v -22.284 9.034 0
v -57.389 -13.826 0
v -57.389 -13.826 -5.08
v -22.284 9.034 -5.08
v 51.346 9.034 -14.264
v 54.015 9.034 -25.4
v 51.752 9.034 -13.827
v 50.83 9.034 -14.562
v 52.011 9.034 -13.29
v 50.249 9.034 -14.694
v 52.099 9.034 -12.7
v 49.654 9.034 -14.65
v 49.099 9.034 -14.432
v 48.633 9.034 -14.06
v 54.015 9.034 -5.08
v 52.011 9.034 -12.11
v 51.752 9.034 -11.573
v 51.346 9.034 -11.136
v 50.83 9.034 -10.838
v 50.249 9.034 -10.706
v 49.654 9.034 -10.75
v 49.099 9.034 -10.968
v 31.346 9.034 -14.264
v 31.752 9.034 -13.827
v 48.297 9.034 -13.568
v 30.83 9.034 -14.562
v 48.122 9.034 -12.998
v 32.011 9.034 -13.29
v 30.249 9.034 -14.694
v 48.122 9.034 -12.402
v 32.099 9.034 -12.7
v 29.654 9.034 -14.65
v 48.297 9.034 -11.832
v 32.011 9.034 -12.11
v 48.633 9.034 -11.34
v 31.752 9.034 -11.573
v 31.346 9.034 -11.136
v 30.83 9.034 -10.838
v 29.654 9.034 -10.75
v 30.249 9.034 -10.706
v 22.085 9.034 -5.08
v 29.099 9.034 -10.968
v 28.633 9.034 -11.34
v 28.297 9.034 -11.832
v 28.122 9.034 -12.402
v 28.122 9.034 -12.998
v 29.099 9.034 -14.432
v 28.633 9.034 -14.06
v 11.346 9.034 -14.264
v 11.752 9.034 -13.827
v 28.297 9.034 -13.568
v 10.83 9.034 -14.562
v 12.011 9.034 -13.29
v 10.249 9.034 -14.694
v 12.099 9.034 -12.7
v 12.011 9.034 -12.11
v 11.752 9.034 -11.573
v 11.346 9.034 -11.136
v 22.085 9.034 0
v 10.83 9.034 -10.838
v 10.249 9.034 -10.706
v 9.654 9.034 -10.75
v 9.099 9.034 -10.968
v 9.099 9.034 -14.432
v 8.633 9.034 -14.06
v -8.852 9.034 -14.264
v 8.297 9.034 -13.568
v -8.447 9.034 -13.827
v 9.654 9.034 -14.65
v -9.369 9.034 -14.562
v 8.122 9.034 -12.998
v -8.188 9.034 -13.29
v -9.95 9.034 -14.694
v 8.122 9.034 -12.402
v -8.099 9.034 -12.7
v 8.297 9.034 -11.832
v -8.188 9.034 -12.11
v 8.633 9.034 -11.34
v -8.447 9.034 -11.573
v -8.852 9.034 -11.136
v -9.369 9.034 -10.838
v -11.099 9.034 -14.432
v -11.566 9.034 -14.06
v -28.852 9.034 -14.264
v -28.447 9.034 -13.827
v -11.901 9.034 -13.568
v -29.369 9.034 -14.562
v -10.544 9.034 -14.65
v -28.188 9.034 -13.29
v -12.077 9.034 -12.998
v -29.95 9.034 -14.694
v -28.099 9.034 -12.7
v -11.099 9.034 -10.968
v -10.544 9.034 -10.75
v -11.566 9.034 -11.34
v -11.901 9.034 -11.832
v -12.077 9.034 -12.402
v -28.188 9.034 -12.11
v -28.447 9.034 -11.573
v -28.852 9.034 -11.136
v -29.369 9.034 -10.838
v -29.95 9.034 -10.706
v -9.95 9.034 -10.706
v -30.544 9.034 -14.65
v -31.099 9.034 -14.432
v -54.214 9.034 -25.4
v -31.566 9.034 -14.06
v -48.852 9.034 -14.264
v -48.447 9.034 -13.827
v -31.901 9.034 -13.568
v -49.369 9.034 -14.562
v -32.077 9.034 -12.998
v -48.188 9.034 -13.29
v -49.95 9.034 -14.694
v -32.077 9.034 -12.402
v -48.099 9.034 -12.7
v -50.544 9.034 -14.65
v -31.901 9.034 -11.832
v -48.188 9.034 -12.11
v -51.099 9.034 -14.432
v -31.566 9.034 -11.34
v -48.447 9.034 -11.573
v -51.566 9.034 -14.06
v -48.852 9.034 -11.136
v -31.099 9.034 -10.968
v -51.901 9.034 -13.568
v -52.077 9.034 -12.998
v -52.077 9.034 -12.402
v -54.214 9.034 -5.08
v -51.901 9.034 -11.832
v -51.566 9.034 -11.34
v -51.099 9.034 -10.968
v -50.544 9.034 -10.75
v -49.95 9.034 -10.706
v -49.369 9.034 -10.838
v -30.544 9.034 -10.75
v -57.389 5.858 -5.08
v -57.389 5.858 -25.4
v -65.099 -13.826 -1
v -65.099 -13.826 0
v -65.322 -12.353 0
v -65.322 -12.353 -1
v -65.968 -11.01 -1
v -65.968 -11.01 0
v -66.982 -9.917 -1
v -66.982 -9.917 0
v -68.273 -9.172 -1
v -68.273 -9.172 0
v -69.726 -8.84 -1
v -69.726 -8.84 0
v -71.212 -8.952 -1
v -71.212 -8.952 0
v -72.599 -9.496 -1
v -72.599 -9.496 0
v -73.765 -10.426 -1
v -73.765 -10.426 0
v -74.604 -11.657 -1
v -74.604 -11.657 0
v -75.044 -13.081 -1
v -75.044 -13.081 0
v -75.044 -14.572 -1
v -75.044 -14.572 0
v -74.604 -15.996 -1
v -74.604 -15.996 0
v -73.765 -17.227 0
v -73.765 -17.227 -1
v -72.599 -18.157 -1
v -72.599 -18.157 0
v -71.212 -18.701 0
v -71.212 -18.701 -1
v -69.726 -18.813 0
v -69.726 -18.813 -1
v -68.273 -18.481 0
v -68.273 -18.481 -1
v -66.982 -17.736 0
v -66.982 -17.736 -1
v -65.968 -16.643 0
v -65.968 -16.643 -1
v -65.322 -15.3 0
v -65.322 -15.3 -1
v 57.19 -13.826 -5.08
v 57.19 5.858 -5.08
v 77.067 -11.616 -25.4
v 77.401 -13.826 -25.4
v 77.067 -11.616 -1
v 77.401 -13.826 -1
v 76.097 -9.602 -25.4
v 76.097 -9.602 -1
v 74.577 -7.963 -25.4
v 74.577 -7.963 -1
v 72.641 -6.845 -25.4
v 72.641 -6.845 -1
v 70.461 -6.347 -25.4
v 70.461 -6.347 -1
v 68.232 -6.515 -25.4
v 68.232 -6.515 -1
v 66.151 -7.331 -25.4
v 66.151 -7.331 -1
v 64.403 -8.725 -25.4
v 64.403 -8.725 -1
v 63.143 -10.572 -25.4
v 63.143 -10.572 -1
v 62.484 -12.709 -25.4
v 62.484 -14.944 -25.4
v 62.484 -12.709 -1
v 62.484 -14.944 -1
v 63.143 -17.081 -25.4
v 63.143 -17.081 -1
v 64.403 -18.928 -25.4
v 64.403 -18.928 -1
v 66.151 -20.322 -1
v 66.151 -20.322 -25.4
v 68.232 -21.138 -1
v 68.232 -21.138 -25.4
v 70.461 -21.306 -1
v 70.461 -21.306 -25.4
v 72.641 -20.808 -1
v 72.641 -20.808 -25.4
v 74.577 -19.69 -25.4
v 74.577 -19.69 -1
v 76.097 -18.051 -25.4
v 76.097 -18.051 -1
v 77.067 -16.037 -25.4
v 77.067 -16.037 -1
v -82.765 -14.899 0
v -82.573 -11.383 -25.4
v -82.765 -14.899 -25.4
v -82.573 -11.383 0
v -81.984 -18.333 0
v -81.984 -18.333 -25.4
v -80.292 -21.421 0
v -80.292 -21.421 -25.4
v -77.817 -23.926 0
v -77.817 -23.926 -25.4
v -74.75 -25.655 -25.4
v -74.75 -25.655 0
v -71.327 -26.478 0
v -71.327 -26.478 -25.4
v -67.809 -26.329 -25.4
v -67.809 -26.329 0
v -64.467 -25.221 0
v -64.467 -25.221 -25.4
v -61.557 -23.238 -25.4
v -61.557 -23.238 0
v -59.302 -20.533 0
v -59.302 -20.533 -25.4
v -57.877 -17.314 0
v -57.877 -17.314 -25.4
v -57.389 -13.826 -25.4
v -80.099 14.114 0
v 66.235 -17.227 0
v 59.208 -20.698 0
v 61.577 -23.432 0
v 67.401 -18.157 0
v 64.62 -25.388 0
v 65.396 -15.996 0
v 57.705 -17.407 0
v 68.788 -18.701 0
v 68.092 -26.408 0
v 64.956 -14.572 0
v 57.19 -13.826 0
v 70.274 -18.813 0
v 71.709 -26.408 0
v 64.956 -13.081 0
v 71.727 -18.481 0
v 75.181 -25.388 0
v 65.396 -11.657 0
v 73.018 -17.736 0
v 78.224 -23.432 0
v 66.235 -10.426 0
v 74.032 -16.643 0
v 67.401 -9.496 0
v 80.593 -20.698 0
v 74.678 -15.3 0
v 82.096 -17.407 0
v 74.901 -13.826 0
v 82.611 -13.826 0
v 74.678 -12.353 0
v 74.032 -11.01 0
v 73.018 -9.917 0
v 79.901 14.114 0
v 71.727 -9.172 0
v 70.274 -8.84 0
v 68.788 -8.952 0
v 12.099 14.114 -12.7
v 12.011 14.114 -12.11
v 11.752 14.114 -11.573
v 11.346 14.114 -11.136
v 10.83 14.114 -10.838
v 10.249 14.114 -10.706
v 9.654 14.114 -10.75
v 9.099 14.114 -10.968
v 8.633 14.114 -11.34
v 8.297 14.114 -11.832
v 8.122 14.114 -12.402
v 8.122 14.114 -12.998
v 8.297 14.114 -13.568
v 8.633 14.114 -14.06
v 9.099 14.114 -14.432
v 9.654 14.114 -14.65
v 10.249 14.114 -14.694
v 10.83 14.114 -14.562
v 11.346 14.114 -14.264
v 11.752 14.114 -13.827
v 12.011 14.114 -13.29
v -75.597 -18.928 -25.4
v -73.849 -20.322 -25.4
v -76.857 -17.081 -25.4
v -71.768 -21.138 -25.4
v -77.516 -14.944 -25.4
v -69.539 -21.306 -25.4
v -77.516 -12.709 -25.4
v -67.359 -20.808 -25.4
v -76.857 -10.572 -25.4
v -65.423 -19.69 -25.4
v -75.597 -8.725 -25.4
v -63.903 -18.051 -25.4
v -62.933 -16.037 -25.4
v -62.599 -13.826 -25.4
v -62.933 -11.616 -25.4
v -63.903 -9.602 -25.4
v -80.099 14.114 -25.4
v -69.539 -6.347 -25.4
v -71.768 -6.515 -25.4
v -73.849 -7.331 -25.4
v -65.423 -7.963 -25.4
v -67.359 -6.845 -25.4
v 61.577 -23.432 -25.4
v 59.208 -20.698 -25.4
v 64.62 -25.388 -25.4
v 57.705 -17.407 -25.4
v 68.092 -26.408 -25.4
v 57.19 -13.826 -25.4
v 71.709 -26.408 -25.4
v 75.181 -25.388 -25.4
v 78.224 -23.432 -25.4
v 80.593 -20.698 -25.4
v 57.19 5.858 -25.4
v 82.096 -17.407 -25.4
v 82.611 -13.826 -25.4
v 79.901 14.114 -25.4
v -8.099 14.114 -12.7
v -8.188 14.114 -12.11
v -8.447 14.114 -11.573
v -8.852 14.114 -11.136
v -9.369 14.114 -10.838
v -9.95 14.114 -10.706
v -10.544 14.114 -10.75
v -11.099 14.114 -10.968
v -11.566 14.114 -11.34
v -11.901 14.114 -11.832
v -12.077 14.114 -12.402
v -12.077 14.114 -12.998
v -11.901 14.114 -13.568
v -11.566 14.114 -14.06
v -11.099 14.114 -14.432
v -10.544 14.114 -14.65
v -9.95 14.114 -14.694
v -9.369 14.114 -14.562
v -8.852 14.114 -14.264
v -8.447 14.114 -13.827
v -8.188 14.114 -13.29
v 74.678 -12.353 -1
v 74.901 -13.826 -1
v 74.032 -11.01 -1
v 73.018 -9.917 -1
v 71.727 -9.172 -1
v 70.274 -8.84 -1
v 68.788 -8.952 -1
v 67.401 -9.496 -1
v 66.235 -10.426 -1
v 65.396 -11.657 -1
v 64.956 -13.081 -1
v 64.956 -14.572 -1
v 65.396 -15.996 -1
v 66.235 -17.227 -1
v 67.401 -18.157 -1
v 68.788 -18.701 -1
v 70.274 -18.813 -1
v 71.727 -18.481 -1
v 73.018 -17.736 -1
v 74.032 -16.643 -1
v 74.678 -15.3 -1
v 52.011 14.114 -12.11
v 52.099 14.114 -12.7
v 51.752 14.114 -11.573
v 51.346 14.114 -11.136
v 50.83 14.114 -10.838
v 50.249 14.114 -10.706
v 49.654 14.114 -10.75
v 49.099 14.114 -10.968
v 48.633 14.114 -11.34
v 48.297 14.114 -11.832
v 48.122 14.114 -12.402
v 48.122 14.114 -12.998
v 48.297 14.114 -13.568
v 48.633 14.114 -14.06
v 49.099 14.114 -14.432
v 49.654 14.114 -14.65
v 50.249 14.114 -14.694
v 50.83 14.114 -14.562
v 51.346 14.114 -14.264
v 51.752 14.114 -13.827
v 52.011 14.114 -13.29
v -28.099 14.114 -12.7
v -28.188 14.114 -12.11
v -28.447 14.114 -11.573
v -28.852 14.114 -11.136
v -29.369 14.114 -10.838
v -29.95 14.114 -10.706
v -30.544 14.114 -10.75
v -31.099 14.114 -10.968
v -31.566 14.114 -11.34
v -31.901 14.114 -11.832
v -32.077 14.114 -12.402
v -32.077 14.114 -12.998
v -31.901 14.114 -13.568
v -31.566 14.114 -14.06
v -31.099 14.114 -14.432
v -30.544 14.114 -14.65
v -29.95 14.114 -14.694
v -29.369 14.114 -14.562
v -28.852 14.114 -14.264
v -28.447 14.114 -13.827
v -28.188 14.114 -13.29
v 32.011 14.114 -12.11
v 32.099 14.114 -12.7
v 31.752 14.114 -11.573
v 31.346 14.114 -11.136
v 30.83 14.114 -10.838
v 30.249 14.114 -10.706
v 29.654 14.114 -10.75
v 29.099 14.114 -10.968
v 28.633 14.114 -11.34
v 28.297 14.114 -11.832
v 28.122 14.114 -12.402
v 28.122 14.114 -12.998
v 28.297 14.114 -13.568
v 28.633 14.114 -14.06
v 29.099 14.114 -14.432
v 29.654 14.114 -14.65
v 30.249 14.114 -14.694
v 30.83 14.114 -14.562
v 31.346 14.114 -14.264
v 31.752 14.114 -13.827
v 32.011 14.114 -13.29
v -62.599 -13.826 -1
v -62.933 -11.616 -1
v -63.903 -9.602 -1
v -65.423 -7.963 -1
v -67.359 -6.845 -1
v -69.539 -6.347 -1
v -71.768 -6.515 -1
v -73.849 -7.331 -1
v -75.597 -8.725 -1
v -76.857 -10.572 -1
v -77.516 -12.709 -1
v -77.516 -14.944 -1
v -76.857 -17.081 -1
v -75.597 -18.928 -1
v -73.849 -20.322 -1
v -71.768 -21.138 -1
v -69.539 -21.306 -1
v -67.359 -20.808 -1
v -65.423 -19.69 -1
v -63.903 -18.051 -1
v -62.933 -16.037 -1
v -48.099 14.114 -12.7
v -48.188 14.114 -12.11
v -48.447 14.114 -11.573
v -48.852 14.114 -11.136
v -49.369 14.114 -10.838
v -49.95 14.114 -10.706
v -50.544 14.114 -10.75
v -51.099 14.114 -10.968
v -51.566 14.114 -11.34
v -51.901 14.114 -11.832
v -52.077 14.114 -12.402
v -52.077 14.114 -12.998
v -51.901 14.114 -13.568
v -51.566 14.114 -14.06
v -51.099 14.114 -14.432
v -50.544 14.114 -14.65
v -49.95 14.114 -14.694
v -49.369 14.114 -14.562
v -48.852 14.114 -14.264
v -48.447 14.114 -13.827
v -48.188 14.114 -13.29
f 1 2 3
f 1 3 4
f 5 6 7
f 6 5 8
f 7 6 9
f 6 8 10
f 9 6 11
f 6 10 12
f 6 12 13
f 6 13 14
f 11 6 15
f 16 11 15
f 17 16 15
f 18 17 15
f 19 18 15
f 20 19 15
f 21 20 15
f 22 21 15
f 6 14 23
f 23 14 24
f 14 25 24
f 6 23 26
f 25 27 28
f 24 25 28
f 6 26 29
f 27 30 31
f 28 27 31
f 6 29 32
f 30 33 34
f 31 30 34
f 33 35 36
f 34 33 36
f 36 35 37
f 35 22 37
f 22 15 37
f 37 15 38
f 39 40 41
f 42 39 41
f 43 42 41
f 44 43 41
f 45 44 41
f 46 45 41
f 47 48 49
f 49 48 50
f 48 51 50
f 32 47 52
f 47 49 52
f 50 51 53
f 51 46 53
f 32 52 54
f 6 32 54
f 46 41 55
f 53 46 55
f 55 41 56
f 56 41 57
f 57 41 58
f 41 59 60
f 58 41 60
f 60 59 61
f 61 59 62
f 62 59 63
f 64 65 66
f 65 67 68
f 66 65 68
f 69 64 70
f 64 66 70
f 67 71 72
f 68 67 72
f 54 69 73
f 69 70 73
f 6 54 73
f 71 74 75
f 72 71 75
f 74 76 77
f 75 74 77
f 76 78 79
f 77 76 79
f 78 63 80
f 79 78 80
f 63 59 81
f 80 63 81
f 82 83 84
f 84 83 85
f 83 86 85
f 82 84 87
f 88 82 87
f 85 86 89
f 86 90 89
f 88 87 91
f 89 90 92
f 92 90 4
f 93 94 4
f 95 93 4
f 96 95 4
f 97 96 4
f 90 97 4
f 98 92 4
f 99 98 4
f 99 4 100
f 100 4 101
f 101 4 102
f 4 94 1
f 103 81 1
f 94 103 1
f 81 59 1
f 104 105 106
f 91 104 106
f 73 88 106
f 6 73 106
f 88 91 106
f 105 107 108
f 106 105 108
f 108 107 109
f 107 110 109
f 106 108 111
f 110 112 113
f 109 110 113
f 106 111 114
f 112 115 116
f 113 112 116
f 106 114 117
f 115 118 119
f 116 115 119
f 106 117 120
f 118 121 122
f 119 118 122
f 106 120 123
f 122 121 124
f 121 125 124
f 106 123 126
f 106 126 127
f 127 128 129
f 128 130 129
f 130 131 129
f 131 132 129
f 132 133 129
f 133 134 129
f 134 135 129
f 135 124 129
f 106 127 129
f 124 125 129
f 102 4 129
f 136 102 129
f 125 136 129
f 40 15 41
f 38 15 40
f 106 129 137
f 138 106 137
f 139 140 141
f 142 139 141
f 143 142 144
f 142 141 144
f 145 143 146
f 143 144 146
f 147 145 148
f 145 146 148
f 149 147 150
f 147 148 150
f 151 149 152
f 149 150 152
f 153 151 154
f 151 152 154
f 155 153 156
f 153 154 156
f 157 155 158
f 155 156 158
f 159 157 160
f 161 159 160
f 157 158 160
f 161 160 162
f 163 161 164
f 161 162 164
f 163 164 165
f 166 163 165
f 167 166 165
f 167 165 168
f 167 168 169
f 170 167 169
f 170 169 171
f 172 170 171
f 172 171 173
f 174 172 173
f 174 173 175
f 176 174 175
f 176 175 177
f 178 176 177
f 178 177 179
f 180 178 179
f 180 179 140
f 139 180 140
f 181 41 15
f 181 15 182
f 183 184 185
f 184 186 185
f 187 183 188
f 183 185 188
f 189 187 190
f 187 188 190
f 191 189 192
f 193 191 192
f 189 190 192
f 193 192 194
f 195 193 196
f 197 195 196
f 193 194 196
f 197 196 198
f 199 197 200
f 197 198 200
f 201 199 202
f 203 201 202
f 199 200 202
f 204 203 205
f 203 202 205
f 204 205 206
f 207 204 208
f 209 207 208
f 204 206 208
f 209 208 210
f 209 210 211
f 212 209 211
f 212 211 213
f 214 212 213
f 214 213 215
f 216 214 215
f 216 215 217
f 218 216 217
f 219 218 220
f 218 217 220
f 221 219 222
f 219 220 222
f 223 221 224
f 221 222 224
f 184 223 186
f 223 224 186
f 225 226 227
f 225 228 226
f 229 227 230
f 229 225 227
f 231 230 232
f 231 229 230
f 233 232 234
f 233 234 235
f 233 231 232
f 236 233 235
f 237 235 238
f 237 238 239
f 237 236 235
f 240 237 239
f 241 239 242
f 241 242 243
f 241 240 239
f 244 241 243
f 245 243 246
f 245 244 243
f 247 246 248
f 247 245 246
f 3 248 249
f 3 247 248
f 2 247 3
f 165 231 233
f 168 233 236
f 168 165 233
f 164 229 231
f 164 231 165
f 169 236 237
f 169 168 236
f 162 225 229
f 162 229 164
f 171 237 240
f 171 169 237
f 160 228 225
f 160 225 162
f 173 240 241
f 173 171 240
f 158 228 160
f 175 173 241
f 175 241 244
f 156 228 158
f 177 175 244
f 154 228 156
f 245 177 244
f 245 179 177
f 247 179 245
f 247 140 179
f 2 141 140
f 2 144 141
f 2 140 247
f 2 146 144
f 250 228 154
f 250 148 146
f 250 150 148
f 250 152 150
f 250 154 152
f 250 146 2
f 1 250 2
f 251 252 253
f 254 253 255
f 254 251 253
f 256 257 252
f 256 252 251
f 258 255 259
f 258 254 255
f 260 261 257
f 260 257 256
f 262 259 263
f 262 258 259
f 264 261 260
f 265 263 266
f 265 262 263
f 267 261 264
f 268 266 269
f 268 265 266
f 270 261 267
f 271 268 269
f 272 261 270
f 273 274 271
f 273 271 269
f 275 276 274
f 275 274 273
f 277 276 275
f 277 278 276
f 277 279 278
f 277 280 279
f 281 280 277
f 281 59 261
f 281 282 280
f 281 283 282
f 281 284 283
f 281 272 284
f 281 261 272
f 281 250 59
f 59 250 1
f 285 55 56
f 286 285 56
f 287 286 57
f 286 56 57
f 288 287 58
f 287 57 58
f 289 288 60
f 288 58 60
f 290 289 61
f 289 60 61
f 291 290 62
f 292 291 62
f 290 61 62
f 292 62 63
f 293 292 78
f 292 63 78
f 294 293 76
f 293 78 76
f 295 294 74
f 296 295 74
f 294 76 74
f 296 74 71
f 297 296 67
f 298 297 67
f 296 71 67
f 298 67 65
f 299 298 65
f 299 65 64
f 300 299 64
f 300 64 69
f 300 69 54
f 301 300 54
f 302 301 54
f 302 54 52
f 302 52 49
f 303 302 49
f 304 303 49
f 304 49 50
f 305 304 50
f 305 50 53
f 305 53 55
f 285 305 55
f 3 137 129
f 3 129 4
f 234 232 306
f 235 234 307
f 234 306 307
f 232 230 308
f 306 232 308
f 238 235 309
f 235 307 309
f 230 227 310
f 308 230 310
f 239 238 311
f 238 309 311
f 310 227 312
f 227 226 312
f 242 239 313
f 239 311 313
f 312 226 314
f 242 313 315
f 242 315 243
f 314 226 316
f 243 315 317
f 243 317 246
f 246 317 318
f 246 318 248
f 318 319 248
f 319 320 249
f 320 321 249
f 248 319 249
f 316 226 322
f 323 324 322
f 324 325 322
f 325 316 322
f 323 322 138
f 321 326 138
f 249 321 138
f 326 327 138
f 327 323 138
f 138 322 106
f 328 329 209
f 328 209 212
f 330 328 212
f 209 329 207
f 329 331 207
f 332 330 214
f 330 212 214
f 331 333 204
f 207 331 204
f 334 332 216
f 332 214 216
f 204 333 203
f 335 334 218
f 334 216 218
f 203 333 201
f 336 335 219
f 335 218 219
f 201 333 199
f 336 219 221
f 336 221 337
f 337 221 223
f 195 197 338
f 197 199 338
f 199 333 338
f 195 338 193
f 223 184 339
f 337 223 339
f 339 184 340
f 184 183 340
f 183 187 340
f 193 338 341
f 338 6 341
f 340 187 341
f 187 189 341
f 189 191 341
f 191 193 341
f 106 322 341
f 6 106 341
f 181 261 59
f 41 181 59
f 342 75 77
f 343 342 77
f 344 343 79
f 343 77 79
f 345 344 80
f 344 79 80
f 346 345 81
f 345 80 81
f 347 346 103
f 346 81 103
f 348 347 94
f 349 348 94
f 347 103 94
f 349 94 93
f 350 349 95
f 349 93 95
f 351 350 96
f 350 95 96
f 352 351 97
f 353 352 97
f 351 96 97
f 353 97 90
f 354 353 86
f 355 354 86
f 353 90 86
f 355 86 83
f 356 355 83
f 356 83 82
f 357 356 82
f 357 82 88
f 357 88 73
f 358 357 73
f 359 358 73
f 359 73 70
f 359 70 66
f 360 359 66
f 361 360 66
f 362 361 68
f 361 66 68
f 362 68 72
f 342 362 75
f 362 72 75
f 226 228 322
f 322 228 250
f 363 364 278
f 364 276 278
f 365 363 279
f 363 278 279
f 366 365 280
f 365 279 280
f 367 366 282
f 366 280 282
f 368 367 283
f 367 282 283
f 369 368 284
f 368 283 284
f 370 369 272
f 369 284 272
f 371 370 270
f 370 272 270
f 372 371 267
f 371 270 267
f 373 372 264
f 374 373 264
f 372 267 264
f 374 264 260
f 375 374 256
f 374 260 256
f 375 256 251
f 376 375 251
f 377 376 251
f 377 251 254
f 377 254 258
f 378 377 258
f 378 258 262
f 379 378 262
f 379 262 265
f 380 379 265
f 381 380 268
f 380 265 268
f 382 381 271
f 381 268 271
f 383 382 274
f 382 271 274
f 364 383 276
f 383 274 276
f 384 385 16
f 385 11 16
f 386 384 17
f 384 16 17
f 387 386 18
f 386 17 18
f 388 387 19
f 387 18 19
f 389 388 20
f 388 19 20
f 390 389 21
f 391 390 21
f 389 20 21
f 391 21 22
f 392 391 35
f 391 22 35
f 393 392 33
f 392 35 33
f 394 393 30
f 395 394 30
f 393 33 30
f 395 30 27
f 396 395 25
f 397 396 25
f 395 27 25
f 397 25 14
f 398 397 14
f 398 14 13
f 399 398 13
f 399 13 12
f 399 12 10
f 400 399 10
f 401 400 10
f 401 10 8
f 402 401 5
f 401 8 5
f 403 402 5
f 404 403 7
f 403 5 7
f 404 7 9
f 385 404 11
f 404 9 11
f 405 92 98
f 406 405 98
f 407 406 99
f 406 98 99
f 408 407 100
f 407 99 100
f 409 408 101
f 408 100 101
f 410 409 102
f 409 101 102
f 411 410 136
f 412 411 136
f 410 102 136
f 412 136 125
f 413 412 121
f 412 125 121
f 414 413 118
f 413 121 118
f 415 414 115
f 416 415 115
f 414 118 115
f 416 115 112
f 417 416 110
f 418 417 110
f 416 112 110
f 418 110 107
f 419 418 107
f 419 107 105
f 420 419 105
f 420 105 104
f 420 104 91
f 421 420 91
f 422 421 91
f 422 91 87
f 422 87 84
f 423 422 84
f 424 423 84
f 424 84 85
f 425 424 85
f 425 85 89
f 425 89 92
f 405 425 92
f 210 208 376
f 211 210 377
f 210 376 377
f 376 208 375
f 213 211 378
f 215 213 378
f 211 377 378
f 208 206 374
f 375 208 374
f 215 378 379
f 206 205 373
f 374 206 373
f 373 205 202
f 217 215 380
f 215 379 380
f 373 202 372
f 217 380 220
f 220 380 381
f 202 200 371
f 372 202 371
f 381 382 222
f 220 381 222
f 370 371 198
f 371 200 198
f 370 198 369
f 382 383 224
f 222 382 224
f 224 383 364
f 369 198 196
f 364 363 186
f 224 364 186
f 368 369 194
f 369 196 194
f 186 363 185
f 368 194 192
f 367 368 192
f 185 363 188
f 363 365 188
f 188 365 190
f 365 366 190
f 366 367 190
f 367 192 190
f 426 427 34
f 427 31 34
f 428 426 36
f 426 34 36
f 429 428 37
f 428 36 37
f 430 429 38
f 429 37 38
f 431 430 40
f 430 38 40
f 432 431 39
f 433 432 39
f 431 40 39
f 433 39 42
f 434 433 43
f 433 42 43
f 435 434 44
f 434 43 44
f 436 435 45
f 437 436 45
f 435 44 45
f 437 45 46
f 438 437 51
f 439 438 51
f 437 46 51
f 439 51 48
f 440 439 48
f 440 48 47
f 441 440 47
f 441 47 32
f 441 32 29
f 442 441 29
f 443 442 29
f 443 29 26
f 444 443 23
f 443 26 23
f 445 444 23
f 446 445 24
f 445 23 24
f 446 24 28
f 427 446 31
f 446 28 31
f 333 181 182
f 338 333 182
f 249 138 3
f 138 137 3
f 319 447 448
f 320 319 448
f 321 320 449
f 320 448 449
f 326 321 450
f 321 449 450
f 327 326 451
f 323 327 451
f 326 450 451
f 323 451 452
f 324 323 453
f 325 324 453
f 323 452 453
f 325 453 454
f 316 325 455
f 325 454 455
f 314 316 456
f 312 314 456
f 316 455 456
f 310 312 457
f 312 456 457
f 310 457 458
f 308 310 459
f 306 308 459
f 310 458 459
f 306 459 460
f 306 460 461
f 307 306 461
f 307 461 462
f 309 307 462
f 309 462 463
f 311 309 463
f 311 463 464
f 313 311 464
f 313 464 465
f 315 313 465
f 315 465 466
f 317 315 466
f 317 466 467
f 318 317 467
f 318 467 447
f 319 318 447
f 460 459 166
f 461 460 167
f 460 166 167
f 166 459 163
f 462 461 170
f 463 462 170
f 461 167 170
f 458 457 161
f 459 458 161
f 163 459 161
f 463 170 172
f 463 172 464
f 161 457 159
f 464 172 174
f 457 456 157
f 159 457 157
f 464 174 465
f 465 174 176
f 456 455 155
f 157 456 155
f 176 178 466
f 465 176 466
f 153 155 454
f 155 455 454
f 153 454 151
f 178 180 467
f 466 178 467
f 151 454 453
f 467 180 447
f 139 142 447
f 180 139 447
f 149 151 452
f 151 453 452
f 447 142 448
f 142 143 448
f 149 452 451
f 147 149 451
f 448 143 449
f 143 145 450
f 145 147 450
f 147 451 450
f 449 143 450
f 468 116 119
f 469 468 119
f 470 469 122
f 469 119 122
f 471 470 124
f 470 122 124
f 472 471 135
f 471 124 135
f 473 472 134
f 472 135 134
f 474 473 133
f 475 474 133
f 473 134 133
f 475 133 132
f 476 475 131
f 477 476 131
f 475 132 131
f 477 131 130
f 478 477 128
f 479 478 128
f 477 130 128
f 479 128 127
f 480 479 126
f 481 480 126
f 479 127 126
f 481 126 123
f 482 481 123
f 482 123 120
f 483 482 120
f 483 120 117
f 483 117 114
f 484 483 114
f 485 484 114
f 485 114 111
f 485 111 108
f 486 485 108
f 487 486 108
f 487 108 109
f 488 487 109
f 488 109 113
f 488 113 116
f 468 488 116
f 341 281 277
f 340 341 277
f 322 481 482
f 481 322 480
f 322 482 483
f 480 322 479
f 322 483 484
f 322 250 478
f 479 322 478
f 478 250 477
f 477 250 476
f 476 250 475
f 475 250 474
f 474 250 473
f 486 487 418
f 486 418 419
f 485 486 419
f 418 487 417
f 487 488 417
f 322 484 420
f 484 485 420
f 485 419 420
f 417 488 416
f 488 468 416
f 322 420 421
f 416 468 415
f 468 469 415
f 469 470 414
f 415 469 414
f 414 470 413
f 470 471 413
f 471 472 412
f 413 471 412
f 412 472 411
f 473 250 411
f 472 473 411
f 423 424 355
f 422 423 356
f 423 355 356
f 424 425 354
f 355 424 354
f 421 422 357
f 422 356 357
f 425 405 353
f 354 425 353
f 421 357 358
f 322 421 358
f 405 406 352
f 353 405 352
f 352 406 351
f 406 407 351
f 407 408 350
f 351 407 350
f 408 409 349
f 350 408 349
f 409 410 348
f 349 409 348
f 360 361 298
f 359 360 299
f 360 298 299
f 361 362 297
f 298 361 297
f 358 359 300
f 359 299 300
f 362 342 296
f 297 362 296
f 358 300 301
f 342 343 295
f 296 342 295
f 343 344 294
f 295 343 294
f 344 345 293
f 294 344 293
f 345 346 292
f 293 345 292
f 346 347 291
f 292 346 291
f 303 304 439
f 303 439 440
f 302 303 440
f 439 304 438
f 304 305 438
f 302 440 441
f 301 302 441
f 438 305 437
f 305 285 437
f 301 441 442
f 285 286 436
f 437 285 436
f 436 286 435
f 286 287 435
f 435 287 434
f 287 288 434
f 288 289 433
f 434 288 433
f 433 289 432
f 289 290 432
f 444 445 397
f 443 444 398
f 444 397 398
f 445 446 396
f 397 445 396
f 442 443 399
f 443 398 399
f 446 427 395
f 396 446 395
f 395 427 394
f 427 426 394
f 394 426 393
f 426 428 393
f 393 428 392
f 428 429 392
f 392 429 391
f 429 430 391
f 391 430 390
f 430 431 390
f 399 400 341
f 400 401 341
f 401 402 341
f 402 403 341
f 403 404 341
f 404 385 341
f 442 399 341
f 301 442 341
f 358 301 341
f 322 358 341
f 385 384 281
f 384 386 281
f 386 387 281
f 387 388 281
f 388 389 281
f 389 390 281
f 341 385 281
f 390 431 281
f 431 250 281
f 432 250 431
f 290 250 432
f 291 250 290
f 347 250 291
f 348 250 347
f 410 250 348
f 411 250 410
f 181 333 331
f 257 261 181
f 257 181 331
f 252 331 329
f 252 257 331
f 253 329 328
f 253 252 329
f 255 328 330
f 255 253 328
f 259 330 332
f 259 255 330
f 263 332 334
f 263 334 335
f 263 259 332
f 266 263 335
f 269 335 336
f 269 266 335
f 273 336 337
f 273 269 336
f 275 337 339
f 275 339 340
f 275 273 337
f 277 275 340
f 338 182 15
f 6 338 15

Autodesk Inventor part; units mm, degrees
ref_plane "YZ Plane" through (0, 0, 0) normal (1, 0, 0) x (0, 1, 0)
ref_plane "XZ Plane" through (0, 0, 0) normal (0, 1, 0) x (-1, 0, 0)
ref_plane "XY Plane" through (0, 0, 0) normal (0, 0, 1) x (1, 0, 0)
ref_plane "Work Plane1" through (0, 0, 0) normal (0, 0, 1) x (1, 0, 0)
sketch "Sketch1" plane through (0, 0, 0) normal (0, 0, 1) x (1, 0, 0)
  circle A0 centre (-70.0994, -13.8265) radius 7.5 projected
  circle A1 centre (69.9006, -13.8265) radius 7.5 projected
  circle A2 centre (-0.0994, -13.8265) radius 5.08 projected
  arc A3 (-82.5729, -11.3834) -> (-57.3889, -13.8265) centre (-70.0994, -13.8265) ccw projected
  line L0 (-57.3889, 5.8585) -> (-57.3889, -13.8265) projected
  line L1 (-54.2139, 9.0335) -> (-57.3889, 5.8585) projected
  line L2 (-25.4994, 9.0335) -> (-54.2139, 9.0335) projected
  arc A4 (-17.8794, 1.4135) -> (-25.4994, 9.0335) centre (-25.4994, 1.4135) ccw projected
  line L3 (-17.8794, -26.5265) -> (-17.8794, 1.4135) projected
  line L4 (17.6806, -26.5265) -> (-17.8794, -26.5265) projected
  line L5 (17.6806, 1.4135) -> (17.6806, -26.5265) projected
  arc A5 (25.3006, 9.0335) -> (17.6806, 1.4135) centre (25.3006, 1.4135) ccw projected
  line L6 (54.0151, 9.0335) -> (25.3006, 9.0335) projected
  line L7 (57.1901, 5.8585) -> (54.0151, 9.0335) projected
  line L8 (57.1901, -13.8265) -> (57.1901, 5.8585) projected
  arc A6 (57.1901, -13.8265) -> (82.6111, -13.8265) centre (69.9006, -13.8265) ccw projected
  line L9 (79.9006, 14.1135) -> (82.6111, -13.8265) projected
  line L10 (-80.0994, 14.1135) -> (79.9006, 14.1135) projected
  line L11 (-82.5729, -11.3834) -> (-80.0994, 14.1135) projected
  line L12 (-25.4994, 9.0335) -> (25.3006, 9.0335)
  point P0 (0, 0)
extrude "Extrusion1" add sketch "Sketch1" against normal blind 25.4 contours L11 L10 L9 A6 L8 L7 L6 L12 L2 L1 L0 A3
sketch "Sketch2" plane through (0, 0, 0) normal (0, 0, 1) x (1, 0, 0)
  circle A0 centre (69.9006, -13.8265) radius 7.5 projected
  circle A1 centre (-70.0994, -13.8265) radius 7.5 projected
  line L0 (-57.3889, -13.8265) -> (-57.3889, 5.8585) projected
  line L1 (-57.3889, 5.8585) -> (-54.2139, 9.0335) projected
  line L2 (-54.2139, 9.0335) -> (54.0151, 9.0335) projected
  line L3 (54.0151, 9.0335) -> (57.1901, 5.8585) projected
  line L4 (57.1901, 5.8585) -> (57.1901, -13.8265) projected
  arc A2 (57.1901, -13.8265) -> (82.6111, -13.8265) centre (69.9006, -13.8265) ccw projected
  line L5 (82.6111, -13.8265) -> (79.9006, 14.1135) projected
  line L6 (79.9006, 14.1135) -> (-80.0994, 14.1135) projected
  line L7 (-80.0994, 14.1135) -> (-82.5729, -11.3834) projected
  arc A3 (-82.5729, -11.3834) -> (-57.3889, -13.8265) centre (-70.0994, -13.8265) ccw projected
  circle A4 centre (-70.0994, -13.8265) radius 5
  circle A5 centre (69.9006, -13.8265) radius 5
  point P0 (0, 0)
  dimension "d2" = 10
  dimension "d3" = 10
extrude "Extrusion2" add sketch "Sketch2" against normal blind 1 contours A0 | A1
sketch "Sketch3" plane through (-54.2139, 9.0335, 0) normal (0, -1, 0) x (1, 0, 0)
  line L0 (0, 0) -> (108.229, 0) projected
  line L1 (108.229, -25.4) -> (0, -25.4) projected
  line L2 (-11.8855, 142.225) -> (-11.8855, -175.0375)
  line L3 (-25.8855, -146.05) -> (-25.8855, 93.95) projected
  line L4 (-25.8855, 0) -> (-25.8855, -25.4) projected
  line L5 (-25.8855, -12.7) -> (4.1145, -12.7)
  circle A0 centre (4.1145, -12.7) radius 2
  circle A1 centre (24.1145, -12.7) radius 2
  circle A2 centre (44.1145, -12.7) radius 2
  line L6 (54.2139, 0) -> (54.2139, -3.82)
  line L7 (134.3133, -12.7) -> (104.3133, -12.7)
  circle A3 centre (104.3133, -12.7) radius 2
  circle A4 centre (84.3133, -12.7) radius 2
  circle A5 centre (64.3133, -12.7) radius 2
  dimension "d6" = 30
  dimension "d9" = 4
  dimension "d10" = 4
  dimension "d11" = 4
extrude "Extrusion3" cut sketch "Sketch3" against normal blind 508
sketch "Sketch4" plane through (0, 0, 0) normal (0, 0, 1) x (1, 0, 0)
  circle A0 centre (69.9006, -13.8265) radius 5 projected
  circle A1 centre (-70.0994, -13.8265) radius 5 projected
  line L0 (-57.3889, -13.8265) -> (-57.3889, 5.8585) projected
  line L1 (-57.3889, 5.8585) -> (-54.2139, 9.0335) projected
  line L2 (-54.2139, 9.0335) -> (54.0151, 9.0335) projected
  line L3 (54.0151, 9.0335) -> (57.1901, 5.8585) projected
  line L4 (57.1901, 5.8585) -> (57.1901, -13.8265) projected
  arc A2 (57.1901, -13.8265) -> (82.6111, -13.8265) centre (69.9006, -13.8265) ccw projected
  line L5 (82.6111, -13.8265) -> (79.9006, 14.1135) projected
  line L6 (79.9006, 14.1135) -> (-80.0994, 14.1135) projected
  line L7 (-80.0994, 14.1135) -> (-82.5729, -11.3834) projected
  arc A3 (-82.5729, -11.3834) -> (-57.3889, -13.8265) centre (-70.0994, -13.8265) ccw projected
  line L8 (-57.3889, -13.8265) -> (-22.2837, 9.0335)
  line L9 (54.0151, 9.0335) -> (-54.2139, 9.0335) projected
  line L10 (-0.0994, 9.0335) -> (-0.0994, 6.3526)
  line L11 (-57.3889, 5.8585) -> (-57.3889, -13.8265) projected
  line L12 (-57.3889, -13.8265) -> (-57.3889, 9.0335)
  line L13 (-57.3889, 9.0335) -> (-22.2837, 9.0335)
  line L14 (57.1901, -13.8265) -> (57.1901, 5.8585)
  line L15 (54.0151, 9.0335) -> (-54.2139, 9.0335)
  line L16 (57.1901, -13.8265) -> (22.0849, 9.0335)
  line L17 (57.1901, -13.8265) -> (57.1901, 9.0335)
  line L18 (57.1901, 9.0335) -> (22.0849, 9.0335)
  point P0 (0, 0)
extrude "Extrusion4" add sketch "Sketch4" against normal blind 5.08 contours L0 L1 L2 L8 | L2 L3 L4 L16 | L18 L17 L3
properties part number "Bed"
